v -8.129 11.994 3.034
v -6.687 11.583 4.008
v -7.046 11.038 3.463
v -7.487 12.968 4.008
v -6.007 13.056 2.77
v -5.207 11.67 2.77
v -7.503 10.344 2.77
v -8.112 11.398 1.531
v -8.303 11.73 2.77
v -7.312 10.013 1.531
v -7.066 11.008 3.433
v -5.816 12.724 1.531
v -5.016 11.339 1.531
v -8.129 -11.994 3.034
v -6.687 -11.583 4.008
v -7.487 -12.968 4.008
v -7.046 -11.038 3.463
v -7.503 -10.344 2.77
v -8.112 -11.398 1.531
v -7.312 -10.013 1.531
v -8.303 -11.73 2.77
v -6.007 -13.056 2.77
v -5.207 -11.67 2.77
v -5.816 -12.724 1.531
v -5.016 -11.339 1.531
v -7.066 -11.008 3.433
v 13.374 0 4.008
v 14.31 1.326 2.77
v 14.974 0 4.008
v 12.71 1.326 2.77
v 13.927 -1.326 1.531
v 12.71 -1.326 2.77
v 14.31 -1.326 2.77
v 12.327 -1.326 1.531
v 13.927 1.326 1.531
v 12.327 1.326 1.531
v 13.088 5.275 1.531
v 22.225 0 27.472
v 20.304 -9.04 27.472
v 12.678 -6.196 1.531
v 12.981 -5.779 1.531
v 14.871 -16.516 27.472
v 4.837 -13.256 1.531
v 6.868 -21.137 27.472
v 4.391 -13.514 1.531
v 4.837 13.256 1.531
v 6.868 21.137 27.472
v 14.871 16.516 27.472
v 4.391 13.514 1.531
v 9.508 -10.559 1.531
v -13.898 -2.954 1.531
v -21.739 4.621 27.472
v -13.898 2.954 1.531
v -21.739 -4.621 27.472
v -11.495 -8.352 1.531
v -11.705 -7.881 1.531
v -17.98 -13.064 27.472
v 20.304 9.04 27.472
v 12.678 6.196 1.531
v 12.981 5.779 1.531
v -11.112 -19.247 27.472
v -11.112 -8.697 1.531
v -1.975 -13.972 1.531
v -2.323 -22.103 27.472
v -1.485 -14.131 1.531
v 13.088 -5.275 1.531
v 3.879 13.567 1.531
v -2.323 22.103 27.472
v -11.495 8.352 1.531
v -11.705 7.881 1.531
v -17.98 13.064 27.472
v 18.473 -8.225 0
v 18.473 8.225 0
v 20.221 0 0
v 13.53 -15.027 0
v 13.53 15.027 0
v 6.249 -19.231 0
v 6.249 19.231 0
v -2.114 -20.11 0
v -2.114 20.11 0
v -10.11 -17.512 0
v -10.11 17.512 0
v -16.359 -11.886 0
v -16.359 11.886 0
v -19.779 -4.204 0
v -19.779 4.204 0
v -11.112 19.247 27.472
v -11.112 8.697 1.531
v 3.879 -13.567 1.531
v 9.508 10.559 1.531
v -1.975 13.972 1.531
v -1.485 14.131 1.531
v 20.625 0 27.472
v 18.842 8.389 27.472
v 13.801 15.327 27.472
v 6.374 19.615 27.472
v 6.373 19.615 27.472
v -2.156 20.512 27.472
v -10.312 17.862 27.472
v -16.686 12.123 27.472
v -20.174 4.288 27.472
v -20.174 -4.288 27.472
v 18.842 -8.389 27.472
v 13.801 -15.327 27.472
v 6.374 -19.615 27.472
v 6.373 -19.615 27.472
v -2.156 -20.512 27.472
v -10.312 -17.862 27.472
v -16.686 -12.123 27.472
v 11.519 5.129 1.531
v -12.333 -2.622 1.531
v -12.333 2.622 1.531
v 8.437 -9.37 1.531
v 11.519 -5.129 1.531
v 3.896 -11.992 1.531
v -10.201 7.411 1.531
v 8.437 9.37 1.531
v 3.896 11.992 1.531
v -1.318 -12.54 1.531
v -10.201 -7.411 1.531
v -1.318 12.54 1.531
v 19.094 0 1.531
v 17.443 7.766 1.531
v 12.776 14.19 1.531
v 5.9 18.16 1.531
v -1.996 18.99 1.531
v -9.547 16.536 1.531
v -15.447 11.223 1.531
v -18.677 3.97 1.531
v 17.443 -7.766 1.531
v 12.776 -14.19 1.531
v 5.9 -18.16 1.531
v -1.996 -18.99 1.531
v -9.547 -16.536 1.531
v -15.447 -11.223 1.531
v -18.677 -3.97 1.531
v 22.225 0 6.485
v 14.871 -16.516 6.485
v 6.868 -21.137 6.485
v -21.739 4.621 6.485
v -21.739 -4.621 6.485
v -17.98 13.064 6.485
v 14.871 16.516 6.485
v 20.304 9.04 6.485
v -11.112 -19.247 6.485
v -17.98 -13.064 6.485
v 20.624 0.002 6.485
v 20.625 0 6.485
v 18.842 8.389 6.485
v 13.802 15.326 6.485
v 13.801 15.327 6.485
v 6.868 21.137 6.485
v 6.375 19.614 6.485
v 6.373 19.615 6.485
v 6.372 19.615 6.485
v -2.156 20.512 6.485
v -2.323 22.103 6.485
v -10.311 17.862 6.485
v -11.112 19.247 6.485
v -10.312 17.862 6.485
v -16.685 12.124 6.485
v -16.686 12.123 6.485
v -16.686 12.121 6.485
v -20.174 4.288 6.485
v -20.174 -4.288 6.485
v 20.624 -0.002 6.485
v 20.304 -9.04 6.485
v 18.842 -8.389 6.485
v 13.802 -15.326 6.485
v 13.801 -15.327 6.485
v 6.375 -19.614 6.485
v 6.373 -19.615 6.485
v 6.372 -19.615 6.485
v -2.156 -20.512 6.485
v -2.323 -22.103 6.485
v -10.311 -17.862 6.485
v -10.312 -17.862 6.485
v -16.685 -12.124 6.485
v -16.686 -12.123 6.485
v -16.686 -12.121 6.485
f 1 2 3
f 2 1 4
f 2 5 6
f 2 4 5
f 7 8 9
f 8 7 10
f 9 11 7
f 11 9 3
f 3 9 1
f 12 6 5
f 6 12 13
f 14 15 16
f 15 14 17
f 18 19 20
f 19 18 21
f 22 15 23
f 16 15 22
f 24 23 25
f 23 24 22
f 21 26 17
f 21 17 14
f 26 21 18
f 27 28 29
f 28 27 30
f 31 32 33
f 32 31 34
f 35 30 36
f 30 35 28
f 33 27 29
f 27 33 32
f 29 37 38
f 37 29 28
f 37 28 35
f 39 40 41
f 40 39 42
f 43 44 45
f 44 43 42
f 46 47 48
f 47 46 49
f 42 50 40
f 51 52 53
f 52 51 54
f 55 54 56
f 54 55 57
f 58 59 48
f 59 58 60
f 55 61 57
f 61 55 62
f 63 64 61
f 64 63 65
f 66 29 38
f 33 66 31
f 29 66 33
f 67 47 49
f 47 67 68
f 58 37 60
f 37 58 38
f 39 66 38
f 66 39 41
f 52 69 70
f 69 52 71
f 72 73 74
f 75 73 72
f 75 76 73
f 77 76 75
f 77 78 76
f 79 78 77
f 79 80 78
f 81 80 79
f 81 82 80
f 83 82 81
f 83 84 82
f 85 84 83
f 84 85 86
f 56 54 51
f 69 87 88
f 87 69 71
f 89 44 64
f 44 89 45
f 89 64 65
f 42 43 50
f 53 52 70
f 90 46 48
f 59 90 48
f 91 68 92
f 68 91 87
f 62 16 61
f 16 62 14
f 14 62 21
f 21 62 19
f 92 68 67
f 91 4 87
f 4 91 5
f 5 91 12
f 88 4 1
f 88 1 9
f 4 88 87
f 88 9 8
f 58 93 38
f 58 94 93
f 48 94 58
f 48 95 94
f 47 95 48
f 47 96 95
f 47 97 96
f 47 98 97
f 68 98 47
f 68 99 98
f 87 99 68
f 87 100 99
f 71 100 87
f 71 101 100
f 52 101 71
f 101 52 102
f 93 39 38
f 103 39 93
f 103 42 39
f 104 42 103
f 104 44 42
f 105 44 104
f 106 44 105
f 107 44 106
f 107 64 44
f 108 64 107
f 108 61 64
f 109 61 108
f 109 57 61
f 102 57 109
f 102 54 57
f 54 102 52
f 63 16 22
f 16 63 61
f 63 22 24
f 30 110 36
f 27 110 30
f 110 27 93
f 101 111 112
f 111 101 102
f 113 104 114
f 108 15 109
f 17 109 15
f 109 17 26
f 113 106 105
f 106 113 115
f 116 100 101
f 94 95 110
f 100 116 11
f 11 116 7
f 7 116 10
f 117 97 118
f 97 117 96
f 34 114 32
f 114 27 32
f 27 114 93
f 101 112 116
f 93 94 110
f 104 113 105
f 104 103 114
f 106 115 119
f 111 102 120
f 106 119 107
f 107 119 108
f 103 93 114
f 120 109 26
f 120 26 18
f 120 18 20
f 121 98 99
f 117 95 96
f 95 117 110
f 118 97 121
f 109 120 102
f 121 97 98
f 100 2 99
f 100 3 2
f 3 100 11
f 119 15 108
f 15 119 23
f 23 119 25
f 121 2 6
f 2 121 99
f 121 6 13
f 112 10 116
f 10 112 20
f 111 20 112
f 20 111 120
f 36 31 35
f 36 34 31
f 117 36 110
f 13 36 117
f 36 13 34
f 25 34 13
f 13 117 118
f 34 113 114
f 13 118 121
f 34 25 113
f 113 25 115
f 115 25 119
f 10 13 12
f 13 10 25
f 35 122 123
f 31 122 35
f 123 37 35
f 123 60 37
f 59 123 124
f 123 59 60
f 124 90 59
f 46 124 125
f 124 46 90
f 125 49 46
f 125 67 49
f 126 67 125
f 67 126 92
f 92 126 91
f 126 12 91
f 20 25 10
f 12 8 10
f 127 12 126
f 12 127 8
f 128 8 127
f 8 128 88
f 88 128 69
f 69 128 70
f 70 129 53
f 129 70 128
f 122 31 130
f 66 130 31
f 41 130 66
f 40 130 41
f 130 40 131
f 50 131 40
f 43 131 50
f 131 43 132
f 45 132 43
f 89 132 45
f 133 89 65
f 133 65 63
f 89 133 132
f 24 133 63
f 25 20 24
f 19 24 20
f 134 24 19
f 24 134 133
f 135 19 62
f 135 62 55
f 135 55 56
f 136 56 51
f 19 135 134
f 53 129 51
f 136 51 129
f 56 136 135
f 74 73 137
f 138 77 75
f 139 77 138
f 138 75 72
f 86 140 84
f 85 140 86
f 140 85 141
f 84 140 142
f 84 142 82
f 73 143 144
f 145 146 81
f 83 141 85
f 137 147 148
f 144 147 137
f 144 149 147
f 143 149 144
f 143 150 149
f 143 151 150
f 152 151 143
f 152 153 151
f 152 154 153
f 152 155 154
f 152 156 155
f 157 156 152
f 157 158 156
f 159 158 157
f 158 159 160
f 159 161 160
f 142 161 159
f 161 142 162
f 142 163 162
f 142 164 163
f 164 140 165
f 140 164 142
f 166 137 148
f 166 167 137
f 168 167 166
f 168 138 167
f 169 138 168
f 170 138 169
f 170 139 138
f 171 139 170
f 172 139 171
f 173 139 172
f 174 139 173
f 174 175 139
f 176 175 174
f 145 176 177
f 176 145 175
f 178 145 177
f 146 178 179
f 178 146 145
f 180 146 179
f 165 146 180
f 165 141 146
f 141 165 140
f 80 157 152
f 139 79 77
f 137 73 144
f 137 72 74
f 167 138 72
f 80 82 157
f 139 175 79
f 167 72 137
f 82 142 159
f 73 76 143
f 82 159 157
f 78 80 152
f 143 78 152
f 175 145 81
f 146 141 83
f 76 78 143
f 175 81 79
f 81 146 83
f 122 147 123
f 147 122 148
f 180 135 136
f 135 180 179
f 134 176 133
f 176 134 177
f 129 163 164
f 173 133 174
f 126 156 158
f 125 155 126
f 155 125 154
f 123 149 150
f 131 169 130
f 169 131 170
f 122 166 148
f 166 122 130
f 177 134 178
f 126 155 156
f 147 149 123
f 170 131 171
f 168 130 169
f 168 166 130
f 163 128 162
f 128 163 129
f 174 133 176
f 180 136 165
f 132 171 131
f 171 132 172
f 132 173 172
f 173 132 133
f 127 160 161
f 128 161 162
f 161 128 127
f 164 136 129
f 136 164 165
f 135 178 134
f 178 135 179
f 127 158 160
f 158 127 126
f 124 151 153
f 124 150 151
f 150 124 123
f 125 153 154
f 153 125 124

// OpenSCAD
inch=25.4;
gold=1.61803398875;

build_stl=0;
gold_overrides=1;
inch_overrides=1;
shell_mm_overrides=1;
shell_fdm_overrides=1;
match_base_override=1;

halve_override=0;

stl_fineness=210;
low_fineness=15;

nozzle_size=0.4;
layer_height=0.30625;

hole_stl_fineness=90;
hole_low_fineness=6;

holes=3;

taper_pc=0.75;

width_mm=40;
height_mm=40;
cup_height_mm=20;
cup_width_mm=20;
hole_size_mm=8;
wall_thickness_mm=1.6;
floor_thickness_mm=1.53125;

width_inches=1.75;
height_inches=2.75;
cup_height_inches=0.375;
cup_width_inches=0.5;
hole_size_inches=0.25;
wall_thickness_inches=0.0625;
floor_thickness_inches=0.0625;

wall_thickness_multiple=4;
floor_thickness_multiple=5;

wall_thickness=shell_fdm_overrides?wall_thickness_multiple*nozzle_size:inch_overrides&&!shell_mm_overrides?wall_thickness_inches*inch:wall_thickness_mm;

floor_thickness=shell_fdm_overrides?floor_thickness_multiple*layer_height:inch_overrides&&!shell_mm_overrides?floor_thickness_inches*inch:floor_thickness_mm;

//cup_volume=1.5*15;

width=inch_overrides?width_inches*inch:width_mm;

height=gold_overrides?1/gold*width:inch_overrides?height_inches*inch:height_mm;


taper=gold_overrides?1/gold:taper_pc;

cup_height=gold_overrides?pow(1/gold,4)*width:inch_overrides?cup_height_inches*inch:cup_height_mm;

cup_width=match_base_override?(width-(cup_height/height)*(width-taper*width))-taper*width:gold_overrides?pow(1/gold,3)*width:inch_overrides?cup_width_inches*inch:cup_width_mm;

hole_size=gold_overrides?1/gold*cup_height-floor_thickness:inch_overrides?hole_size_inches*inch:hole_size_mm;



fineness=build_stl?stl_fineness:low_fineness;
hole_fineness=build_stl?hole_stl_fineness:hole_low_fineness;

hole_fineness_offset=(1+floor_thickness/height)*taper*width/2-cos(180/fineness)*(1+floor_thickness/height)*taper*width/2;


hole_offset=sin(asin( (hole_size/2) / ( (taper*width)/2 + ((floor_thickness/height)*taper*width)/2)));


hole_edge=((1+floor_thickness/height)*taper*width-wall_thickness*2)/2-hole_offset*(1+floor_thickness/height)*taper*width/2-hole_fineness_offset;

hole_depth=taper*width/2+hole_offset+((hole_size/2+floor_thickness)/height)*taper*width/2-hole_edge+hole_offset+0.002;


module terracotta_pot(){
    difference(){
        
        cylinder(height,taper*width/2,width/2,$fn=fineness);
        
        translate([0,0,floor_thickness])
        cylinder(height+0.001-floor_thickness,taper*width/2+(floor_thickness/height)*(width-taper*width)/2-wall_thickness,width/2-wall_thickness,$fn=fineness);
        
        for (i=[1:holes]){
            rotate([0,0,360*(i/holes)])
            scale([1,1/gold,1])
            translate([hole_edge-0.001,0,floor_thickness])
            rotate([0,90,0])
            cylinder(hole_depth+0.002,hole_size,hole_size,$fn=hole_fineness);
        }

        if (halve_override){
            translate([0,-width/2-(1+cup_height/height)*taper*width/2,-0.001])
            cube([cup_width/2+width/2+wall_thickness+(1+cup_height/height)*taper*width/2,cup_width+width+(1+cup_height/height)*taper*width+wall_thickness*2,height+0.002]);
        }
    }

    difference(){
        cylinder(cup_height,taper*width/2+cup_width/2,taper*width/2+(cup_height/height)*(1-taper)*width/2+cup_width/2,$fn=fineness);
        
        translate([0,0,floor_thickness])
        cylinder(cup_height+0.001-floor_thickness,taper*width/2+(floor_thickness/height)*(1-taper)*width/2+cup_width/2-wall_thickness,taper*width/2+(cup_height/height)*(width*(1-taper)/2)+cup_width/2-wall_thickness,$fn=fineness);
        
        if (halve_override){
            translate([0,-width/2-(1+cup_height/height)*taper*width/2,-0.001])
            cube([cup_width/2+width/2+wall_thickness+(1+cup_height/height)*taper*width/2,cup_width+width+(1+cup_height/height)*taper*width+wall_thickness*2,height+0.002]);
        }
    }

}

//translate([0,0,-height-0.01])
terracotta_pot();
